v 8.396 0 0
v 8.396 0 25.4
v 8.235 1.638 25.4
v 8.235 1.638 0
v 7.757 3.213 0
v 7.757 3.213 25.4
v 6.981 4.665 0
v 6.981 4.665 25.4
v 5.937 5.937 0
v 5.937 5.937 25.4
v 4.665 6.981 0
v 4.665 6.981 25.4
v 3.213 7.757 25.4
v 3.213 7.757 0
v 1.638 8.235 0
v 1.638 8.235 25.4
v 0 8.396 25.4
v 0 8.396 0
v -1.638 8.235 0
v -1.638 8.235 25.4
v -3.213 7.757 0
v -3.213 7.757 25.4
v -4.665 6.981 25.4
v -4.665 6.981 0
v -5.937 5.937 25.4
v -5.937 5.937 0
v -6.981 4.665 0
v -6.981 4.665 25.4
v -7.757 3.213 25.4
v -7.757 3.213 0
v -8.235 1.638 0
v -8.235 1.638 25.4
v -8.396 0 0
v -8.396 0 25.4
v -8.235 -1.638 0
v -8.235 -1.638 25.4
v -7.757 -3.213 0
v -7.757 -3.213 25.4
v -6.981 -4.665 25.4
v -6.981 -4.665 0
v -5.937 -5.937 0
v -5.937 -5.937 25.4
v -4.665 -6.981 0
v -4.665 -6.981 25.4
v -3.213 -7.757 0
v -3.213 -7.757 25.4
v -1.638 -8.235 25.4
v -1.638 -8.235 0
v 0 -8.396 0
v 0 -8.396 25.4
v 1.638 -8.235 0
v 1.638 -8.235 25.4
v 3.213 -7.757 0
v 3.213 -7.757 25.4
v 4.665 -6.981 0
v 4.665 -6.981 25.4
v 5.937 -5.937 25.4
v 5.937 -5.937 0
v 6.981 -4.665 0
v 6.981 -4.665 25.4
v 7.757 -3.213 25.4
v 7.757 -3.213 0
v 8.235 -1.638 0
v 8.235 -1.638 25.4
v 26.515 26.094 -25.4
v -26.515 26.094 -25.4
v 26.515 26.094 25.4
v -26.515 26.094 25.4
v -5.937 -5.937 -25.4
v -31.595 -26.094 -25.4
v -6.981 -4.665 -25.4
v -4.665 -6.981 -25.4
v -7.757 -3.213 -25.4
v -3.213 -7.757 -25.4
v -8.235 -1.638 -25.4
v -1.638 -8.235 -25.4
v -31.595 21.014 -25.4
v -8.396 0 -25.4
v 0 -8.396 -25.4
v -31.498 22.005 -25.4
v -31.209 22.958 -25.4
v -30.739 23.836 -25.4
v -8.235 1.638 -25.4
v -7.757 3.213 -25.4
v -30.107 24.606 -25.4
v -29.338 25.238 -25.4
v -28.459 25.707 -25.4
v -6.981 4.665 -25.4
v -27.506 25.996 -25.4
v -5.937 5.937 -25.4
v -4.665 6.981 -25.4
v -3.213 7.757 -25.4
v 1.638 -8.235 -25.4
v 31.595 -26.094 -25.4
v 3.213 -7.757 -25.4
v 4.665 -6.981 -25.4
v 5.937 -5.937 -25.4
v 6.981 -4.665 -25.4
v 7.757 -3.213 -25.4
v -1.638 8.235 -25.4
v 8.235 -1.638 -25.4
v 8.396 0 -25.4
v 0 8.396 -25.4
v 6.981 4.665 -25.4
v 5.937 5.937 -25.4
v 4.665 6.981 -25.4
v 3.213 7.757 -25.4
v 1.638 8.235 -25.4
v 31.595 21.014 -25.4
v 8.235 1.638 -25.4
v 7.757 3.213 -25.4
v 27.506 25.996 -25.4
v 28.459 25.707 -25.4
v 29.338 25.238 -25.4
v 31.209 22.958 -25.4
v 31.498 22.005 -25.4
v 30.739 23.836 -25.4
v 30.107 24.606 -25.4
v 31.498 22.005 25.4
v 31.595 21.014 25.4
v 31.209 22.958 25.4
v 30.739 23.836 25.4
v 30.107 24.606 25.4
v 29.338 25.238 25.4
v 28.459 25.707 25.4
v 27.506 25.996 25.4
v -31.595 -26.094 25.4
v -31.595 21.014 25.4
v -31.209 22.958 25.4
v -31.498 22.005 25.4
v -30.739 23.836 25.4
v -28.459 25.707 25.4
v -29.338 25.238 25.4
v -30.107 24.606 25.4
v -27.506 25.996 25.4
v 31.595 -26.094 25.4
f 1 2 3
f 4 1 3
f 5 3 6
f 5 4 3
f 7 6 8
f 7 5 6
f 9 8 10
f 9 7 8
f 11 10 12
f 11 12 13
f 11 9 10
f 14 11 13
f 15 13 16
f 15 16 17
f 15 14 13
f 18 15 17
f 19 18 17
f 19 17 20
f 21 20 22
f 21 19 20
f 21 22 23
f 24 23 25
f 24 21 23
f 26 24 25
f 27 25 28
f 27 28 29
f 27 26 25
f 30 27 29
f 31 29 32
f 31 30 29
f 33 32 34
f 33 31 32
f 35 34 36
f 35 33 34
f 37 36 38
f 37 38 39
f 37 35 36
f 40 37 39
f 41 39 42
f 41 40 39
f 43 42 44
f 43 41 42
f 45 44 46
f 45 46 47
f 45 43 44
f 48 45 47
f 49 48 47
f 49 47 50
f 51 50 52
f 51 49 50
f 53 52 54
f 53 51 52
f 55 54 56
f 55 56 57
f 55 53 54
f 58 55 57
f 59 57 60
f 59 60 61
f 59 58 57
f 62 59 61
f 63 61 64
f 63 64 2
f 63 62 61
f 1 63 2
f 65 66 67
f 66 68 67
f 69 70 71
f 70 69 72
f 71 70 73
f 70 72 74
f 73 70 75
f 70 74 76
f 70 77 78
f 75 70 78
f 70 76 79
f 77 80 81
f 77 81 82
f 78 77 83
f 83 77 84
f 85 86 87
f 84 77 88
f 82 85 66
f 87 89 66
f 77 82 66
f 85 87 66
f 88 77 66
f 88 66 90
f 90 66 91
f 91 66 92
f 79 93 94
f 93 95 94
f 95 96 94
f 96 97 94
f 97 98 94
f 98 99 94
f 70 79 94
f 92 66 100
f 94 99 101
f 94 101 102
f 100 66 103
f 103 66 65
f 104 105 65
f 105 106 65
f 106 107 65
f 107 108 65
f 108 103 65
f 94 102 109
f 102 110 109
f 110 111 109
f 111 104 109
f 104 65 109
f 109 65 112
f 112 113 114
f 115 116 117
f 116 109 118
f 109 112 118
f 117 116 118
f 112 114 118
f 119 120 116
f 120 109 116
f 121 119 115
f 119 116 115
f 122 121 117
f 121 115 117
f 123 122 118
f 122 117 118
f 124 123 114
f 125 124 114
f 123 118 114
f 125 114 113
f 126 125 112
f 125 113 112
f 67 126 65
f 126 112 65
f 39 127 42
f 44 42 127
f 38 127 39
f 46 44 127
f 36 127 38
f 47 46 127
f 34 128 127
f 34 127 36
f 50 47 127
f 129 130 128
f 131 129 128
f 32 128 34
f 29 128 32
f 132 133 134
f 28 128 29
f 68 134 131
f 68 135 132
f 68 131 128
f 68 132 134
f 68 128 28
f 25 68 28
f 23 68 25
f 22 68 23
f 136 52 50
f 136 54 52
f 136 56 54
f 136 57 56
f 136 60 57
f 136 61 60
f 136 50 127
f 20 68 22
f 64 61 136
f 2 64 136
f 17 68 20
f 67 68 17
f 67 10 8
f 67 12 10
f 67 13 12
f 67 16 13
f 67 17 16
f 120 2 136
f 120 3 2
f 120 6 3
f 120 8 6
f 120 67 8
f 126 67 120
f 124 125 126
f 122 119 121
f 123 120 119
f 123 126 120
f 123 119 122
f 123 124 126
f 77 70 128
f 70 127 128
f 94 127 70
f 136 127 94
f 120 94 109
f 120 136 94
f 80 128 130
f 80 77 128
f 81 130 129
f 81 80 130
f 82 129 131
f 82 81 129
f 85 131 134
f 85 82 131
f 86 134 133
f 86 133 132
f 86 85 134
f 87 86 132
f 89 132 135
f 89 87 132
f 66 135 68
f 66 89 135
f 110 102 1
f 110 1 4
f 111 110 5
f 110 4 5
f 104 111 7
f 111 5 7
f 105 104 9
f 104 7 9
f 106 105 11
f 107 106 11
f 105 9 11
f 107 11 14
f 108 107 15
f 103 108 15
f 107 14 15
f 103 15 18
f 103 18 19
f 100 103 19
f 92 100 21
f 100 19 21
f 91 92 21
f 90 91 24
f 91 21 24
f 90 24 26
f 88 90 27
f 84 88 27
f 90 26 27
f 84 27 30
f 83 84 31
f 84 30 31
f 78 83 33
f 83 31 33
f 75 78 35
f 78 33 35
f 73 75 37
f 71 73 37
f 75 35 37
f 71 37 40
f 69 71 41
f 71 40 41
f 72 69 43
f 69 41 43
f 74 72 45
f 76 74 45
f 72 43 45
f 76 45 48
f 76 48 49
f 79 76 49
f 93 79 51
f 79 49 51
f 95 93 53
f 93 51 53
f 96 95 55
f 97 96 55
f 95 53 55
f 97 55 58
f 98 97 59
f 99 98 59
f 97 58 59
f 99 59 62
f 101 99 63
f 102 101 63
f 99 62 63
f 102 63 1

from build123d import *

# Parameters (mm, degrees)
F0_W          = 63.1906017661
F0_H          = 52.1872714162
F0_R          = 8.3960945755
F1_DEPTH      = 25.4
F1_DEPTH_BACK = 25.4
F2_R          = 5.08


# Not quite as in the source:
# - the program builds the solid bodies; features that only make, move or delete a surface that nothing else refers to are left out


with BuildPart() as f1:
    # F0 (on Top) → F1 (new body, two sides)
    with BuildSketch(Plane.XY) as f1_sk:
        Rectangle(F0_W, F0_H)
        Circle(F0_R, mode=Mode.SUBTRACT)
    extrude(amount=F1_DEPTH)
    extrude(f1_sk.sketch, amount=-F1_DEPTH_BACK)

    # F2
    f2_edges = [f1.edges().sort_by_distance(p)[0] for p in [
        (-31.595301, 26.093636, 0),
        (31.595301, 26.093636, 0),
    ]]
    fillet(f2_edges, radius=F2_R)


solid = f1.part
